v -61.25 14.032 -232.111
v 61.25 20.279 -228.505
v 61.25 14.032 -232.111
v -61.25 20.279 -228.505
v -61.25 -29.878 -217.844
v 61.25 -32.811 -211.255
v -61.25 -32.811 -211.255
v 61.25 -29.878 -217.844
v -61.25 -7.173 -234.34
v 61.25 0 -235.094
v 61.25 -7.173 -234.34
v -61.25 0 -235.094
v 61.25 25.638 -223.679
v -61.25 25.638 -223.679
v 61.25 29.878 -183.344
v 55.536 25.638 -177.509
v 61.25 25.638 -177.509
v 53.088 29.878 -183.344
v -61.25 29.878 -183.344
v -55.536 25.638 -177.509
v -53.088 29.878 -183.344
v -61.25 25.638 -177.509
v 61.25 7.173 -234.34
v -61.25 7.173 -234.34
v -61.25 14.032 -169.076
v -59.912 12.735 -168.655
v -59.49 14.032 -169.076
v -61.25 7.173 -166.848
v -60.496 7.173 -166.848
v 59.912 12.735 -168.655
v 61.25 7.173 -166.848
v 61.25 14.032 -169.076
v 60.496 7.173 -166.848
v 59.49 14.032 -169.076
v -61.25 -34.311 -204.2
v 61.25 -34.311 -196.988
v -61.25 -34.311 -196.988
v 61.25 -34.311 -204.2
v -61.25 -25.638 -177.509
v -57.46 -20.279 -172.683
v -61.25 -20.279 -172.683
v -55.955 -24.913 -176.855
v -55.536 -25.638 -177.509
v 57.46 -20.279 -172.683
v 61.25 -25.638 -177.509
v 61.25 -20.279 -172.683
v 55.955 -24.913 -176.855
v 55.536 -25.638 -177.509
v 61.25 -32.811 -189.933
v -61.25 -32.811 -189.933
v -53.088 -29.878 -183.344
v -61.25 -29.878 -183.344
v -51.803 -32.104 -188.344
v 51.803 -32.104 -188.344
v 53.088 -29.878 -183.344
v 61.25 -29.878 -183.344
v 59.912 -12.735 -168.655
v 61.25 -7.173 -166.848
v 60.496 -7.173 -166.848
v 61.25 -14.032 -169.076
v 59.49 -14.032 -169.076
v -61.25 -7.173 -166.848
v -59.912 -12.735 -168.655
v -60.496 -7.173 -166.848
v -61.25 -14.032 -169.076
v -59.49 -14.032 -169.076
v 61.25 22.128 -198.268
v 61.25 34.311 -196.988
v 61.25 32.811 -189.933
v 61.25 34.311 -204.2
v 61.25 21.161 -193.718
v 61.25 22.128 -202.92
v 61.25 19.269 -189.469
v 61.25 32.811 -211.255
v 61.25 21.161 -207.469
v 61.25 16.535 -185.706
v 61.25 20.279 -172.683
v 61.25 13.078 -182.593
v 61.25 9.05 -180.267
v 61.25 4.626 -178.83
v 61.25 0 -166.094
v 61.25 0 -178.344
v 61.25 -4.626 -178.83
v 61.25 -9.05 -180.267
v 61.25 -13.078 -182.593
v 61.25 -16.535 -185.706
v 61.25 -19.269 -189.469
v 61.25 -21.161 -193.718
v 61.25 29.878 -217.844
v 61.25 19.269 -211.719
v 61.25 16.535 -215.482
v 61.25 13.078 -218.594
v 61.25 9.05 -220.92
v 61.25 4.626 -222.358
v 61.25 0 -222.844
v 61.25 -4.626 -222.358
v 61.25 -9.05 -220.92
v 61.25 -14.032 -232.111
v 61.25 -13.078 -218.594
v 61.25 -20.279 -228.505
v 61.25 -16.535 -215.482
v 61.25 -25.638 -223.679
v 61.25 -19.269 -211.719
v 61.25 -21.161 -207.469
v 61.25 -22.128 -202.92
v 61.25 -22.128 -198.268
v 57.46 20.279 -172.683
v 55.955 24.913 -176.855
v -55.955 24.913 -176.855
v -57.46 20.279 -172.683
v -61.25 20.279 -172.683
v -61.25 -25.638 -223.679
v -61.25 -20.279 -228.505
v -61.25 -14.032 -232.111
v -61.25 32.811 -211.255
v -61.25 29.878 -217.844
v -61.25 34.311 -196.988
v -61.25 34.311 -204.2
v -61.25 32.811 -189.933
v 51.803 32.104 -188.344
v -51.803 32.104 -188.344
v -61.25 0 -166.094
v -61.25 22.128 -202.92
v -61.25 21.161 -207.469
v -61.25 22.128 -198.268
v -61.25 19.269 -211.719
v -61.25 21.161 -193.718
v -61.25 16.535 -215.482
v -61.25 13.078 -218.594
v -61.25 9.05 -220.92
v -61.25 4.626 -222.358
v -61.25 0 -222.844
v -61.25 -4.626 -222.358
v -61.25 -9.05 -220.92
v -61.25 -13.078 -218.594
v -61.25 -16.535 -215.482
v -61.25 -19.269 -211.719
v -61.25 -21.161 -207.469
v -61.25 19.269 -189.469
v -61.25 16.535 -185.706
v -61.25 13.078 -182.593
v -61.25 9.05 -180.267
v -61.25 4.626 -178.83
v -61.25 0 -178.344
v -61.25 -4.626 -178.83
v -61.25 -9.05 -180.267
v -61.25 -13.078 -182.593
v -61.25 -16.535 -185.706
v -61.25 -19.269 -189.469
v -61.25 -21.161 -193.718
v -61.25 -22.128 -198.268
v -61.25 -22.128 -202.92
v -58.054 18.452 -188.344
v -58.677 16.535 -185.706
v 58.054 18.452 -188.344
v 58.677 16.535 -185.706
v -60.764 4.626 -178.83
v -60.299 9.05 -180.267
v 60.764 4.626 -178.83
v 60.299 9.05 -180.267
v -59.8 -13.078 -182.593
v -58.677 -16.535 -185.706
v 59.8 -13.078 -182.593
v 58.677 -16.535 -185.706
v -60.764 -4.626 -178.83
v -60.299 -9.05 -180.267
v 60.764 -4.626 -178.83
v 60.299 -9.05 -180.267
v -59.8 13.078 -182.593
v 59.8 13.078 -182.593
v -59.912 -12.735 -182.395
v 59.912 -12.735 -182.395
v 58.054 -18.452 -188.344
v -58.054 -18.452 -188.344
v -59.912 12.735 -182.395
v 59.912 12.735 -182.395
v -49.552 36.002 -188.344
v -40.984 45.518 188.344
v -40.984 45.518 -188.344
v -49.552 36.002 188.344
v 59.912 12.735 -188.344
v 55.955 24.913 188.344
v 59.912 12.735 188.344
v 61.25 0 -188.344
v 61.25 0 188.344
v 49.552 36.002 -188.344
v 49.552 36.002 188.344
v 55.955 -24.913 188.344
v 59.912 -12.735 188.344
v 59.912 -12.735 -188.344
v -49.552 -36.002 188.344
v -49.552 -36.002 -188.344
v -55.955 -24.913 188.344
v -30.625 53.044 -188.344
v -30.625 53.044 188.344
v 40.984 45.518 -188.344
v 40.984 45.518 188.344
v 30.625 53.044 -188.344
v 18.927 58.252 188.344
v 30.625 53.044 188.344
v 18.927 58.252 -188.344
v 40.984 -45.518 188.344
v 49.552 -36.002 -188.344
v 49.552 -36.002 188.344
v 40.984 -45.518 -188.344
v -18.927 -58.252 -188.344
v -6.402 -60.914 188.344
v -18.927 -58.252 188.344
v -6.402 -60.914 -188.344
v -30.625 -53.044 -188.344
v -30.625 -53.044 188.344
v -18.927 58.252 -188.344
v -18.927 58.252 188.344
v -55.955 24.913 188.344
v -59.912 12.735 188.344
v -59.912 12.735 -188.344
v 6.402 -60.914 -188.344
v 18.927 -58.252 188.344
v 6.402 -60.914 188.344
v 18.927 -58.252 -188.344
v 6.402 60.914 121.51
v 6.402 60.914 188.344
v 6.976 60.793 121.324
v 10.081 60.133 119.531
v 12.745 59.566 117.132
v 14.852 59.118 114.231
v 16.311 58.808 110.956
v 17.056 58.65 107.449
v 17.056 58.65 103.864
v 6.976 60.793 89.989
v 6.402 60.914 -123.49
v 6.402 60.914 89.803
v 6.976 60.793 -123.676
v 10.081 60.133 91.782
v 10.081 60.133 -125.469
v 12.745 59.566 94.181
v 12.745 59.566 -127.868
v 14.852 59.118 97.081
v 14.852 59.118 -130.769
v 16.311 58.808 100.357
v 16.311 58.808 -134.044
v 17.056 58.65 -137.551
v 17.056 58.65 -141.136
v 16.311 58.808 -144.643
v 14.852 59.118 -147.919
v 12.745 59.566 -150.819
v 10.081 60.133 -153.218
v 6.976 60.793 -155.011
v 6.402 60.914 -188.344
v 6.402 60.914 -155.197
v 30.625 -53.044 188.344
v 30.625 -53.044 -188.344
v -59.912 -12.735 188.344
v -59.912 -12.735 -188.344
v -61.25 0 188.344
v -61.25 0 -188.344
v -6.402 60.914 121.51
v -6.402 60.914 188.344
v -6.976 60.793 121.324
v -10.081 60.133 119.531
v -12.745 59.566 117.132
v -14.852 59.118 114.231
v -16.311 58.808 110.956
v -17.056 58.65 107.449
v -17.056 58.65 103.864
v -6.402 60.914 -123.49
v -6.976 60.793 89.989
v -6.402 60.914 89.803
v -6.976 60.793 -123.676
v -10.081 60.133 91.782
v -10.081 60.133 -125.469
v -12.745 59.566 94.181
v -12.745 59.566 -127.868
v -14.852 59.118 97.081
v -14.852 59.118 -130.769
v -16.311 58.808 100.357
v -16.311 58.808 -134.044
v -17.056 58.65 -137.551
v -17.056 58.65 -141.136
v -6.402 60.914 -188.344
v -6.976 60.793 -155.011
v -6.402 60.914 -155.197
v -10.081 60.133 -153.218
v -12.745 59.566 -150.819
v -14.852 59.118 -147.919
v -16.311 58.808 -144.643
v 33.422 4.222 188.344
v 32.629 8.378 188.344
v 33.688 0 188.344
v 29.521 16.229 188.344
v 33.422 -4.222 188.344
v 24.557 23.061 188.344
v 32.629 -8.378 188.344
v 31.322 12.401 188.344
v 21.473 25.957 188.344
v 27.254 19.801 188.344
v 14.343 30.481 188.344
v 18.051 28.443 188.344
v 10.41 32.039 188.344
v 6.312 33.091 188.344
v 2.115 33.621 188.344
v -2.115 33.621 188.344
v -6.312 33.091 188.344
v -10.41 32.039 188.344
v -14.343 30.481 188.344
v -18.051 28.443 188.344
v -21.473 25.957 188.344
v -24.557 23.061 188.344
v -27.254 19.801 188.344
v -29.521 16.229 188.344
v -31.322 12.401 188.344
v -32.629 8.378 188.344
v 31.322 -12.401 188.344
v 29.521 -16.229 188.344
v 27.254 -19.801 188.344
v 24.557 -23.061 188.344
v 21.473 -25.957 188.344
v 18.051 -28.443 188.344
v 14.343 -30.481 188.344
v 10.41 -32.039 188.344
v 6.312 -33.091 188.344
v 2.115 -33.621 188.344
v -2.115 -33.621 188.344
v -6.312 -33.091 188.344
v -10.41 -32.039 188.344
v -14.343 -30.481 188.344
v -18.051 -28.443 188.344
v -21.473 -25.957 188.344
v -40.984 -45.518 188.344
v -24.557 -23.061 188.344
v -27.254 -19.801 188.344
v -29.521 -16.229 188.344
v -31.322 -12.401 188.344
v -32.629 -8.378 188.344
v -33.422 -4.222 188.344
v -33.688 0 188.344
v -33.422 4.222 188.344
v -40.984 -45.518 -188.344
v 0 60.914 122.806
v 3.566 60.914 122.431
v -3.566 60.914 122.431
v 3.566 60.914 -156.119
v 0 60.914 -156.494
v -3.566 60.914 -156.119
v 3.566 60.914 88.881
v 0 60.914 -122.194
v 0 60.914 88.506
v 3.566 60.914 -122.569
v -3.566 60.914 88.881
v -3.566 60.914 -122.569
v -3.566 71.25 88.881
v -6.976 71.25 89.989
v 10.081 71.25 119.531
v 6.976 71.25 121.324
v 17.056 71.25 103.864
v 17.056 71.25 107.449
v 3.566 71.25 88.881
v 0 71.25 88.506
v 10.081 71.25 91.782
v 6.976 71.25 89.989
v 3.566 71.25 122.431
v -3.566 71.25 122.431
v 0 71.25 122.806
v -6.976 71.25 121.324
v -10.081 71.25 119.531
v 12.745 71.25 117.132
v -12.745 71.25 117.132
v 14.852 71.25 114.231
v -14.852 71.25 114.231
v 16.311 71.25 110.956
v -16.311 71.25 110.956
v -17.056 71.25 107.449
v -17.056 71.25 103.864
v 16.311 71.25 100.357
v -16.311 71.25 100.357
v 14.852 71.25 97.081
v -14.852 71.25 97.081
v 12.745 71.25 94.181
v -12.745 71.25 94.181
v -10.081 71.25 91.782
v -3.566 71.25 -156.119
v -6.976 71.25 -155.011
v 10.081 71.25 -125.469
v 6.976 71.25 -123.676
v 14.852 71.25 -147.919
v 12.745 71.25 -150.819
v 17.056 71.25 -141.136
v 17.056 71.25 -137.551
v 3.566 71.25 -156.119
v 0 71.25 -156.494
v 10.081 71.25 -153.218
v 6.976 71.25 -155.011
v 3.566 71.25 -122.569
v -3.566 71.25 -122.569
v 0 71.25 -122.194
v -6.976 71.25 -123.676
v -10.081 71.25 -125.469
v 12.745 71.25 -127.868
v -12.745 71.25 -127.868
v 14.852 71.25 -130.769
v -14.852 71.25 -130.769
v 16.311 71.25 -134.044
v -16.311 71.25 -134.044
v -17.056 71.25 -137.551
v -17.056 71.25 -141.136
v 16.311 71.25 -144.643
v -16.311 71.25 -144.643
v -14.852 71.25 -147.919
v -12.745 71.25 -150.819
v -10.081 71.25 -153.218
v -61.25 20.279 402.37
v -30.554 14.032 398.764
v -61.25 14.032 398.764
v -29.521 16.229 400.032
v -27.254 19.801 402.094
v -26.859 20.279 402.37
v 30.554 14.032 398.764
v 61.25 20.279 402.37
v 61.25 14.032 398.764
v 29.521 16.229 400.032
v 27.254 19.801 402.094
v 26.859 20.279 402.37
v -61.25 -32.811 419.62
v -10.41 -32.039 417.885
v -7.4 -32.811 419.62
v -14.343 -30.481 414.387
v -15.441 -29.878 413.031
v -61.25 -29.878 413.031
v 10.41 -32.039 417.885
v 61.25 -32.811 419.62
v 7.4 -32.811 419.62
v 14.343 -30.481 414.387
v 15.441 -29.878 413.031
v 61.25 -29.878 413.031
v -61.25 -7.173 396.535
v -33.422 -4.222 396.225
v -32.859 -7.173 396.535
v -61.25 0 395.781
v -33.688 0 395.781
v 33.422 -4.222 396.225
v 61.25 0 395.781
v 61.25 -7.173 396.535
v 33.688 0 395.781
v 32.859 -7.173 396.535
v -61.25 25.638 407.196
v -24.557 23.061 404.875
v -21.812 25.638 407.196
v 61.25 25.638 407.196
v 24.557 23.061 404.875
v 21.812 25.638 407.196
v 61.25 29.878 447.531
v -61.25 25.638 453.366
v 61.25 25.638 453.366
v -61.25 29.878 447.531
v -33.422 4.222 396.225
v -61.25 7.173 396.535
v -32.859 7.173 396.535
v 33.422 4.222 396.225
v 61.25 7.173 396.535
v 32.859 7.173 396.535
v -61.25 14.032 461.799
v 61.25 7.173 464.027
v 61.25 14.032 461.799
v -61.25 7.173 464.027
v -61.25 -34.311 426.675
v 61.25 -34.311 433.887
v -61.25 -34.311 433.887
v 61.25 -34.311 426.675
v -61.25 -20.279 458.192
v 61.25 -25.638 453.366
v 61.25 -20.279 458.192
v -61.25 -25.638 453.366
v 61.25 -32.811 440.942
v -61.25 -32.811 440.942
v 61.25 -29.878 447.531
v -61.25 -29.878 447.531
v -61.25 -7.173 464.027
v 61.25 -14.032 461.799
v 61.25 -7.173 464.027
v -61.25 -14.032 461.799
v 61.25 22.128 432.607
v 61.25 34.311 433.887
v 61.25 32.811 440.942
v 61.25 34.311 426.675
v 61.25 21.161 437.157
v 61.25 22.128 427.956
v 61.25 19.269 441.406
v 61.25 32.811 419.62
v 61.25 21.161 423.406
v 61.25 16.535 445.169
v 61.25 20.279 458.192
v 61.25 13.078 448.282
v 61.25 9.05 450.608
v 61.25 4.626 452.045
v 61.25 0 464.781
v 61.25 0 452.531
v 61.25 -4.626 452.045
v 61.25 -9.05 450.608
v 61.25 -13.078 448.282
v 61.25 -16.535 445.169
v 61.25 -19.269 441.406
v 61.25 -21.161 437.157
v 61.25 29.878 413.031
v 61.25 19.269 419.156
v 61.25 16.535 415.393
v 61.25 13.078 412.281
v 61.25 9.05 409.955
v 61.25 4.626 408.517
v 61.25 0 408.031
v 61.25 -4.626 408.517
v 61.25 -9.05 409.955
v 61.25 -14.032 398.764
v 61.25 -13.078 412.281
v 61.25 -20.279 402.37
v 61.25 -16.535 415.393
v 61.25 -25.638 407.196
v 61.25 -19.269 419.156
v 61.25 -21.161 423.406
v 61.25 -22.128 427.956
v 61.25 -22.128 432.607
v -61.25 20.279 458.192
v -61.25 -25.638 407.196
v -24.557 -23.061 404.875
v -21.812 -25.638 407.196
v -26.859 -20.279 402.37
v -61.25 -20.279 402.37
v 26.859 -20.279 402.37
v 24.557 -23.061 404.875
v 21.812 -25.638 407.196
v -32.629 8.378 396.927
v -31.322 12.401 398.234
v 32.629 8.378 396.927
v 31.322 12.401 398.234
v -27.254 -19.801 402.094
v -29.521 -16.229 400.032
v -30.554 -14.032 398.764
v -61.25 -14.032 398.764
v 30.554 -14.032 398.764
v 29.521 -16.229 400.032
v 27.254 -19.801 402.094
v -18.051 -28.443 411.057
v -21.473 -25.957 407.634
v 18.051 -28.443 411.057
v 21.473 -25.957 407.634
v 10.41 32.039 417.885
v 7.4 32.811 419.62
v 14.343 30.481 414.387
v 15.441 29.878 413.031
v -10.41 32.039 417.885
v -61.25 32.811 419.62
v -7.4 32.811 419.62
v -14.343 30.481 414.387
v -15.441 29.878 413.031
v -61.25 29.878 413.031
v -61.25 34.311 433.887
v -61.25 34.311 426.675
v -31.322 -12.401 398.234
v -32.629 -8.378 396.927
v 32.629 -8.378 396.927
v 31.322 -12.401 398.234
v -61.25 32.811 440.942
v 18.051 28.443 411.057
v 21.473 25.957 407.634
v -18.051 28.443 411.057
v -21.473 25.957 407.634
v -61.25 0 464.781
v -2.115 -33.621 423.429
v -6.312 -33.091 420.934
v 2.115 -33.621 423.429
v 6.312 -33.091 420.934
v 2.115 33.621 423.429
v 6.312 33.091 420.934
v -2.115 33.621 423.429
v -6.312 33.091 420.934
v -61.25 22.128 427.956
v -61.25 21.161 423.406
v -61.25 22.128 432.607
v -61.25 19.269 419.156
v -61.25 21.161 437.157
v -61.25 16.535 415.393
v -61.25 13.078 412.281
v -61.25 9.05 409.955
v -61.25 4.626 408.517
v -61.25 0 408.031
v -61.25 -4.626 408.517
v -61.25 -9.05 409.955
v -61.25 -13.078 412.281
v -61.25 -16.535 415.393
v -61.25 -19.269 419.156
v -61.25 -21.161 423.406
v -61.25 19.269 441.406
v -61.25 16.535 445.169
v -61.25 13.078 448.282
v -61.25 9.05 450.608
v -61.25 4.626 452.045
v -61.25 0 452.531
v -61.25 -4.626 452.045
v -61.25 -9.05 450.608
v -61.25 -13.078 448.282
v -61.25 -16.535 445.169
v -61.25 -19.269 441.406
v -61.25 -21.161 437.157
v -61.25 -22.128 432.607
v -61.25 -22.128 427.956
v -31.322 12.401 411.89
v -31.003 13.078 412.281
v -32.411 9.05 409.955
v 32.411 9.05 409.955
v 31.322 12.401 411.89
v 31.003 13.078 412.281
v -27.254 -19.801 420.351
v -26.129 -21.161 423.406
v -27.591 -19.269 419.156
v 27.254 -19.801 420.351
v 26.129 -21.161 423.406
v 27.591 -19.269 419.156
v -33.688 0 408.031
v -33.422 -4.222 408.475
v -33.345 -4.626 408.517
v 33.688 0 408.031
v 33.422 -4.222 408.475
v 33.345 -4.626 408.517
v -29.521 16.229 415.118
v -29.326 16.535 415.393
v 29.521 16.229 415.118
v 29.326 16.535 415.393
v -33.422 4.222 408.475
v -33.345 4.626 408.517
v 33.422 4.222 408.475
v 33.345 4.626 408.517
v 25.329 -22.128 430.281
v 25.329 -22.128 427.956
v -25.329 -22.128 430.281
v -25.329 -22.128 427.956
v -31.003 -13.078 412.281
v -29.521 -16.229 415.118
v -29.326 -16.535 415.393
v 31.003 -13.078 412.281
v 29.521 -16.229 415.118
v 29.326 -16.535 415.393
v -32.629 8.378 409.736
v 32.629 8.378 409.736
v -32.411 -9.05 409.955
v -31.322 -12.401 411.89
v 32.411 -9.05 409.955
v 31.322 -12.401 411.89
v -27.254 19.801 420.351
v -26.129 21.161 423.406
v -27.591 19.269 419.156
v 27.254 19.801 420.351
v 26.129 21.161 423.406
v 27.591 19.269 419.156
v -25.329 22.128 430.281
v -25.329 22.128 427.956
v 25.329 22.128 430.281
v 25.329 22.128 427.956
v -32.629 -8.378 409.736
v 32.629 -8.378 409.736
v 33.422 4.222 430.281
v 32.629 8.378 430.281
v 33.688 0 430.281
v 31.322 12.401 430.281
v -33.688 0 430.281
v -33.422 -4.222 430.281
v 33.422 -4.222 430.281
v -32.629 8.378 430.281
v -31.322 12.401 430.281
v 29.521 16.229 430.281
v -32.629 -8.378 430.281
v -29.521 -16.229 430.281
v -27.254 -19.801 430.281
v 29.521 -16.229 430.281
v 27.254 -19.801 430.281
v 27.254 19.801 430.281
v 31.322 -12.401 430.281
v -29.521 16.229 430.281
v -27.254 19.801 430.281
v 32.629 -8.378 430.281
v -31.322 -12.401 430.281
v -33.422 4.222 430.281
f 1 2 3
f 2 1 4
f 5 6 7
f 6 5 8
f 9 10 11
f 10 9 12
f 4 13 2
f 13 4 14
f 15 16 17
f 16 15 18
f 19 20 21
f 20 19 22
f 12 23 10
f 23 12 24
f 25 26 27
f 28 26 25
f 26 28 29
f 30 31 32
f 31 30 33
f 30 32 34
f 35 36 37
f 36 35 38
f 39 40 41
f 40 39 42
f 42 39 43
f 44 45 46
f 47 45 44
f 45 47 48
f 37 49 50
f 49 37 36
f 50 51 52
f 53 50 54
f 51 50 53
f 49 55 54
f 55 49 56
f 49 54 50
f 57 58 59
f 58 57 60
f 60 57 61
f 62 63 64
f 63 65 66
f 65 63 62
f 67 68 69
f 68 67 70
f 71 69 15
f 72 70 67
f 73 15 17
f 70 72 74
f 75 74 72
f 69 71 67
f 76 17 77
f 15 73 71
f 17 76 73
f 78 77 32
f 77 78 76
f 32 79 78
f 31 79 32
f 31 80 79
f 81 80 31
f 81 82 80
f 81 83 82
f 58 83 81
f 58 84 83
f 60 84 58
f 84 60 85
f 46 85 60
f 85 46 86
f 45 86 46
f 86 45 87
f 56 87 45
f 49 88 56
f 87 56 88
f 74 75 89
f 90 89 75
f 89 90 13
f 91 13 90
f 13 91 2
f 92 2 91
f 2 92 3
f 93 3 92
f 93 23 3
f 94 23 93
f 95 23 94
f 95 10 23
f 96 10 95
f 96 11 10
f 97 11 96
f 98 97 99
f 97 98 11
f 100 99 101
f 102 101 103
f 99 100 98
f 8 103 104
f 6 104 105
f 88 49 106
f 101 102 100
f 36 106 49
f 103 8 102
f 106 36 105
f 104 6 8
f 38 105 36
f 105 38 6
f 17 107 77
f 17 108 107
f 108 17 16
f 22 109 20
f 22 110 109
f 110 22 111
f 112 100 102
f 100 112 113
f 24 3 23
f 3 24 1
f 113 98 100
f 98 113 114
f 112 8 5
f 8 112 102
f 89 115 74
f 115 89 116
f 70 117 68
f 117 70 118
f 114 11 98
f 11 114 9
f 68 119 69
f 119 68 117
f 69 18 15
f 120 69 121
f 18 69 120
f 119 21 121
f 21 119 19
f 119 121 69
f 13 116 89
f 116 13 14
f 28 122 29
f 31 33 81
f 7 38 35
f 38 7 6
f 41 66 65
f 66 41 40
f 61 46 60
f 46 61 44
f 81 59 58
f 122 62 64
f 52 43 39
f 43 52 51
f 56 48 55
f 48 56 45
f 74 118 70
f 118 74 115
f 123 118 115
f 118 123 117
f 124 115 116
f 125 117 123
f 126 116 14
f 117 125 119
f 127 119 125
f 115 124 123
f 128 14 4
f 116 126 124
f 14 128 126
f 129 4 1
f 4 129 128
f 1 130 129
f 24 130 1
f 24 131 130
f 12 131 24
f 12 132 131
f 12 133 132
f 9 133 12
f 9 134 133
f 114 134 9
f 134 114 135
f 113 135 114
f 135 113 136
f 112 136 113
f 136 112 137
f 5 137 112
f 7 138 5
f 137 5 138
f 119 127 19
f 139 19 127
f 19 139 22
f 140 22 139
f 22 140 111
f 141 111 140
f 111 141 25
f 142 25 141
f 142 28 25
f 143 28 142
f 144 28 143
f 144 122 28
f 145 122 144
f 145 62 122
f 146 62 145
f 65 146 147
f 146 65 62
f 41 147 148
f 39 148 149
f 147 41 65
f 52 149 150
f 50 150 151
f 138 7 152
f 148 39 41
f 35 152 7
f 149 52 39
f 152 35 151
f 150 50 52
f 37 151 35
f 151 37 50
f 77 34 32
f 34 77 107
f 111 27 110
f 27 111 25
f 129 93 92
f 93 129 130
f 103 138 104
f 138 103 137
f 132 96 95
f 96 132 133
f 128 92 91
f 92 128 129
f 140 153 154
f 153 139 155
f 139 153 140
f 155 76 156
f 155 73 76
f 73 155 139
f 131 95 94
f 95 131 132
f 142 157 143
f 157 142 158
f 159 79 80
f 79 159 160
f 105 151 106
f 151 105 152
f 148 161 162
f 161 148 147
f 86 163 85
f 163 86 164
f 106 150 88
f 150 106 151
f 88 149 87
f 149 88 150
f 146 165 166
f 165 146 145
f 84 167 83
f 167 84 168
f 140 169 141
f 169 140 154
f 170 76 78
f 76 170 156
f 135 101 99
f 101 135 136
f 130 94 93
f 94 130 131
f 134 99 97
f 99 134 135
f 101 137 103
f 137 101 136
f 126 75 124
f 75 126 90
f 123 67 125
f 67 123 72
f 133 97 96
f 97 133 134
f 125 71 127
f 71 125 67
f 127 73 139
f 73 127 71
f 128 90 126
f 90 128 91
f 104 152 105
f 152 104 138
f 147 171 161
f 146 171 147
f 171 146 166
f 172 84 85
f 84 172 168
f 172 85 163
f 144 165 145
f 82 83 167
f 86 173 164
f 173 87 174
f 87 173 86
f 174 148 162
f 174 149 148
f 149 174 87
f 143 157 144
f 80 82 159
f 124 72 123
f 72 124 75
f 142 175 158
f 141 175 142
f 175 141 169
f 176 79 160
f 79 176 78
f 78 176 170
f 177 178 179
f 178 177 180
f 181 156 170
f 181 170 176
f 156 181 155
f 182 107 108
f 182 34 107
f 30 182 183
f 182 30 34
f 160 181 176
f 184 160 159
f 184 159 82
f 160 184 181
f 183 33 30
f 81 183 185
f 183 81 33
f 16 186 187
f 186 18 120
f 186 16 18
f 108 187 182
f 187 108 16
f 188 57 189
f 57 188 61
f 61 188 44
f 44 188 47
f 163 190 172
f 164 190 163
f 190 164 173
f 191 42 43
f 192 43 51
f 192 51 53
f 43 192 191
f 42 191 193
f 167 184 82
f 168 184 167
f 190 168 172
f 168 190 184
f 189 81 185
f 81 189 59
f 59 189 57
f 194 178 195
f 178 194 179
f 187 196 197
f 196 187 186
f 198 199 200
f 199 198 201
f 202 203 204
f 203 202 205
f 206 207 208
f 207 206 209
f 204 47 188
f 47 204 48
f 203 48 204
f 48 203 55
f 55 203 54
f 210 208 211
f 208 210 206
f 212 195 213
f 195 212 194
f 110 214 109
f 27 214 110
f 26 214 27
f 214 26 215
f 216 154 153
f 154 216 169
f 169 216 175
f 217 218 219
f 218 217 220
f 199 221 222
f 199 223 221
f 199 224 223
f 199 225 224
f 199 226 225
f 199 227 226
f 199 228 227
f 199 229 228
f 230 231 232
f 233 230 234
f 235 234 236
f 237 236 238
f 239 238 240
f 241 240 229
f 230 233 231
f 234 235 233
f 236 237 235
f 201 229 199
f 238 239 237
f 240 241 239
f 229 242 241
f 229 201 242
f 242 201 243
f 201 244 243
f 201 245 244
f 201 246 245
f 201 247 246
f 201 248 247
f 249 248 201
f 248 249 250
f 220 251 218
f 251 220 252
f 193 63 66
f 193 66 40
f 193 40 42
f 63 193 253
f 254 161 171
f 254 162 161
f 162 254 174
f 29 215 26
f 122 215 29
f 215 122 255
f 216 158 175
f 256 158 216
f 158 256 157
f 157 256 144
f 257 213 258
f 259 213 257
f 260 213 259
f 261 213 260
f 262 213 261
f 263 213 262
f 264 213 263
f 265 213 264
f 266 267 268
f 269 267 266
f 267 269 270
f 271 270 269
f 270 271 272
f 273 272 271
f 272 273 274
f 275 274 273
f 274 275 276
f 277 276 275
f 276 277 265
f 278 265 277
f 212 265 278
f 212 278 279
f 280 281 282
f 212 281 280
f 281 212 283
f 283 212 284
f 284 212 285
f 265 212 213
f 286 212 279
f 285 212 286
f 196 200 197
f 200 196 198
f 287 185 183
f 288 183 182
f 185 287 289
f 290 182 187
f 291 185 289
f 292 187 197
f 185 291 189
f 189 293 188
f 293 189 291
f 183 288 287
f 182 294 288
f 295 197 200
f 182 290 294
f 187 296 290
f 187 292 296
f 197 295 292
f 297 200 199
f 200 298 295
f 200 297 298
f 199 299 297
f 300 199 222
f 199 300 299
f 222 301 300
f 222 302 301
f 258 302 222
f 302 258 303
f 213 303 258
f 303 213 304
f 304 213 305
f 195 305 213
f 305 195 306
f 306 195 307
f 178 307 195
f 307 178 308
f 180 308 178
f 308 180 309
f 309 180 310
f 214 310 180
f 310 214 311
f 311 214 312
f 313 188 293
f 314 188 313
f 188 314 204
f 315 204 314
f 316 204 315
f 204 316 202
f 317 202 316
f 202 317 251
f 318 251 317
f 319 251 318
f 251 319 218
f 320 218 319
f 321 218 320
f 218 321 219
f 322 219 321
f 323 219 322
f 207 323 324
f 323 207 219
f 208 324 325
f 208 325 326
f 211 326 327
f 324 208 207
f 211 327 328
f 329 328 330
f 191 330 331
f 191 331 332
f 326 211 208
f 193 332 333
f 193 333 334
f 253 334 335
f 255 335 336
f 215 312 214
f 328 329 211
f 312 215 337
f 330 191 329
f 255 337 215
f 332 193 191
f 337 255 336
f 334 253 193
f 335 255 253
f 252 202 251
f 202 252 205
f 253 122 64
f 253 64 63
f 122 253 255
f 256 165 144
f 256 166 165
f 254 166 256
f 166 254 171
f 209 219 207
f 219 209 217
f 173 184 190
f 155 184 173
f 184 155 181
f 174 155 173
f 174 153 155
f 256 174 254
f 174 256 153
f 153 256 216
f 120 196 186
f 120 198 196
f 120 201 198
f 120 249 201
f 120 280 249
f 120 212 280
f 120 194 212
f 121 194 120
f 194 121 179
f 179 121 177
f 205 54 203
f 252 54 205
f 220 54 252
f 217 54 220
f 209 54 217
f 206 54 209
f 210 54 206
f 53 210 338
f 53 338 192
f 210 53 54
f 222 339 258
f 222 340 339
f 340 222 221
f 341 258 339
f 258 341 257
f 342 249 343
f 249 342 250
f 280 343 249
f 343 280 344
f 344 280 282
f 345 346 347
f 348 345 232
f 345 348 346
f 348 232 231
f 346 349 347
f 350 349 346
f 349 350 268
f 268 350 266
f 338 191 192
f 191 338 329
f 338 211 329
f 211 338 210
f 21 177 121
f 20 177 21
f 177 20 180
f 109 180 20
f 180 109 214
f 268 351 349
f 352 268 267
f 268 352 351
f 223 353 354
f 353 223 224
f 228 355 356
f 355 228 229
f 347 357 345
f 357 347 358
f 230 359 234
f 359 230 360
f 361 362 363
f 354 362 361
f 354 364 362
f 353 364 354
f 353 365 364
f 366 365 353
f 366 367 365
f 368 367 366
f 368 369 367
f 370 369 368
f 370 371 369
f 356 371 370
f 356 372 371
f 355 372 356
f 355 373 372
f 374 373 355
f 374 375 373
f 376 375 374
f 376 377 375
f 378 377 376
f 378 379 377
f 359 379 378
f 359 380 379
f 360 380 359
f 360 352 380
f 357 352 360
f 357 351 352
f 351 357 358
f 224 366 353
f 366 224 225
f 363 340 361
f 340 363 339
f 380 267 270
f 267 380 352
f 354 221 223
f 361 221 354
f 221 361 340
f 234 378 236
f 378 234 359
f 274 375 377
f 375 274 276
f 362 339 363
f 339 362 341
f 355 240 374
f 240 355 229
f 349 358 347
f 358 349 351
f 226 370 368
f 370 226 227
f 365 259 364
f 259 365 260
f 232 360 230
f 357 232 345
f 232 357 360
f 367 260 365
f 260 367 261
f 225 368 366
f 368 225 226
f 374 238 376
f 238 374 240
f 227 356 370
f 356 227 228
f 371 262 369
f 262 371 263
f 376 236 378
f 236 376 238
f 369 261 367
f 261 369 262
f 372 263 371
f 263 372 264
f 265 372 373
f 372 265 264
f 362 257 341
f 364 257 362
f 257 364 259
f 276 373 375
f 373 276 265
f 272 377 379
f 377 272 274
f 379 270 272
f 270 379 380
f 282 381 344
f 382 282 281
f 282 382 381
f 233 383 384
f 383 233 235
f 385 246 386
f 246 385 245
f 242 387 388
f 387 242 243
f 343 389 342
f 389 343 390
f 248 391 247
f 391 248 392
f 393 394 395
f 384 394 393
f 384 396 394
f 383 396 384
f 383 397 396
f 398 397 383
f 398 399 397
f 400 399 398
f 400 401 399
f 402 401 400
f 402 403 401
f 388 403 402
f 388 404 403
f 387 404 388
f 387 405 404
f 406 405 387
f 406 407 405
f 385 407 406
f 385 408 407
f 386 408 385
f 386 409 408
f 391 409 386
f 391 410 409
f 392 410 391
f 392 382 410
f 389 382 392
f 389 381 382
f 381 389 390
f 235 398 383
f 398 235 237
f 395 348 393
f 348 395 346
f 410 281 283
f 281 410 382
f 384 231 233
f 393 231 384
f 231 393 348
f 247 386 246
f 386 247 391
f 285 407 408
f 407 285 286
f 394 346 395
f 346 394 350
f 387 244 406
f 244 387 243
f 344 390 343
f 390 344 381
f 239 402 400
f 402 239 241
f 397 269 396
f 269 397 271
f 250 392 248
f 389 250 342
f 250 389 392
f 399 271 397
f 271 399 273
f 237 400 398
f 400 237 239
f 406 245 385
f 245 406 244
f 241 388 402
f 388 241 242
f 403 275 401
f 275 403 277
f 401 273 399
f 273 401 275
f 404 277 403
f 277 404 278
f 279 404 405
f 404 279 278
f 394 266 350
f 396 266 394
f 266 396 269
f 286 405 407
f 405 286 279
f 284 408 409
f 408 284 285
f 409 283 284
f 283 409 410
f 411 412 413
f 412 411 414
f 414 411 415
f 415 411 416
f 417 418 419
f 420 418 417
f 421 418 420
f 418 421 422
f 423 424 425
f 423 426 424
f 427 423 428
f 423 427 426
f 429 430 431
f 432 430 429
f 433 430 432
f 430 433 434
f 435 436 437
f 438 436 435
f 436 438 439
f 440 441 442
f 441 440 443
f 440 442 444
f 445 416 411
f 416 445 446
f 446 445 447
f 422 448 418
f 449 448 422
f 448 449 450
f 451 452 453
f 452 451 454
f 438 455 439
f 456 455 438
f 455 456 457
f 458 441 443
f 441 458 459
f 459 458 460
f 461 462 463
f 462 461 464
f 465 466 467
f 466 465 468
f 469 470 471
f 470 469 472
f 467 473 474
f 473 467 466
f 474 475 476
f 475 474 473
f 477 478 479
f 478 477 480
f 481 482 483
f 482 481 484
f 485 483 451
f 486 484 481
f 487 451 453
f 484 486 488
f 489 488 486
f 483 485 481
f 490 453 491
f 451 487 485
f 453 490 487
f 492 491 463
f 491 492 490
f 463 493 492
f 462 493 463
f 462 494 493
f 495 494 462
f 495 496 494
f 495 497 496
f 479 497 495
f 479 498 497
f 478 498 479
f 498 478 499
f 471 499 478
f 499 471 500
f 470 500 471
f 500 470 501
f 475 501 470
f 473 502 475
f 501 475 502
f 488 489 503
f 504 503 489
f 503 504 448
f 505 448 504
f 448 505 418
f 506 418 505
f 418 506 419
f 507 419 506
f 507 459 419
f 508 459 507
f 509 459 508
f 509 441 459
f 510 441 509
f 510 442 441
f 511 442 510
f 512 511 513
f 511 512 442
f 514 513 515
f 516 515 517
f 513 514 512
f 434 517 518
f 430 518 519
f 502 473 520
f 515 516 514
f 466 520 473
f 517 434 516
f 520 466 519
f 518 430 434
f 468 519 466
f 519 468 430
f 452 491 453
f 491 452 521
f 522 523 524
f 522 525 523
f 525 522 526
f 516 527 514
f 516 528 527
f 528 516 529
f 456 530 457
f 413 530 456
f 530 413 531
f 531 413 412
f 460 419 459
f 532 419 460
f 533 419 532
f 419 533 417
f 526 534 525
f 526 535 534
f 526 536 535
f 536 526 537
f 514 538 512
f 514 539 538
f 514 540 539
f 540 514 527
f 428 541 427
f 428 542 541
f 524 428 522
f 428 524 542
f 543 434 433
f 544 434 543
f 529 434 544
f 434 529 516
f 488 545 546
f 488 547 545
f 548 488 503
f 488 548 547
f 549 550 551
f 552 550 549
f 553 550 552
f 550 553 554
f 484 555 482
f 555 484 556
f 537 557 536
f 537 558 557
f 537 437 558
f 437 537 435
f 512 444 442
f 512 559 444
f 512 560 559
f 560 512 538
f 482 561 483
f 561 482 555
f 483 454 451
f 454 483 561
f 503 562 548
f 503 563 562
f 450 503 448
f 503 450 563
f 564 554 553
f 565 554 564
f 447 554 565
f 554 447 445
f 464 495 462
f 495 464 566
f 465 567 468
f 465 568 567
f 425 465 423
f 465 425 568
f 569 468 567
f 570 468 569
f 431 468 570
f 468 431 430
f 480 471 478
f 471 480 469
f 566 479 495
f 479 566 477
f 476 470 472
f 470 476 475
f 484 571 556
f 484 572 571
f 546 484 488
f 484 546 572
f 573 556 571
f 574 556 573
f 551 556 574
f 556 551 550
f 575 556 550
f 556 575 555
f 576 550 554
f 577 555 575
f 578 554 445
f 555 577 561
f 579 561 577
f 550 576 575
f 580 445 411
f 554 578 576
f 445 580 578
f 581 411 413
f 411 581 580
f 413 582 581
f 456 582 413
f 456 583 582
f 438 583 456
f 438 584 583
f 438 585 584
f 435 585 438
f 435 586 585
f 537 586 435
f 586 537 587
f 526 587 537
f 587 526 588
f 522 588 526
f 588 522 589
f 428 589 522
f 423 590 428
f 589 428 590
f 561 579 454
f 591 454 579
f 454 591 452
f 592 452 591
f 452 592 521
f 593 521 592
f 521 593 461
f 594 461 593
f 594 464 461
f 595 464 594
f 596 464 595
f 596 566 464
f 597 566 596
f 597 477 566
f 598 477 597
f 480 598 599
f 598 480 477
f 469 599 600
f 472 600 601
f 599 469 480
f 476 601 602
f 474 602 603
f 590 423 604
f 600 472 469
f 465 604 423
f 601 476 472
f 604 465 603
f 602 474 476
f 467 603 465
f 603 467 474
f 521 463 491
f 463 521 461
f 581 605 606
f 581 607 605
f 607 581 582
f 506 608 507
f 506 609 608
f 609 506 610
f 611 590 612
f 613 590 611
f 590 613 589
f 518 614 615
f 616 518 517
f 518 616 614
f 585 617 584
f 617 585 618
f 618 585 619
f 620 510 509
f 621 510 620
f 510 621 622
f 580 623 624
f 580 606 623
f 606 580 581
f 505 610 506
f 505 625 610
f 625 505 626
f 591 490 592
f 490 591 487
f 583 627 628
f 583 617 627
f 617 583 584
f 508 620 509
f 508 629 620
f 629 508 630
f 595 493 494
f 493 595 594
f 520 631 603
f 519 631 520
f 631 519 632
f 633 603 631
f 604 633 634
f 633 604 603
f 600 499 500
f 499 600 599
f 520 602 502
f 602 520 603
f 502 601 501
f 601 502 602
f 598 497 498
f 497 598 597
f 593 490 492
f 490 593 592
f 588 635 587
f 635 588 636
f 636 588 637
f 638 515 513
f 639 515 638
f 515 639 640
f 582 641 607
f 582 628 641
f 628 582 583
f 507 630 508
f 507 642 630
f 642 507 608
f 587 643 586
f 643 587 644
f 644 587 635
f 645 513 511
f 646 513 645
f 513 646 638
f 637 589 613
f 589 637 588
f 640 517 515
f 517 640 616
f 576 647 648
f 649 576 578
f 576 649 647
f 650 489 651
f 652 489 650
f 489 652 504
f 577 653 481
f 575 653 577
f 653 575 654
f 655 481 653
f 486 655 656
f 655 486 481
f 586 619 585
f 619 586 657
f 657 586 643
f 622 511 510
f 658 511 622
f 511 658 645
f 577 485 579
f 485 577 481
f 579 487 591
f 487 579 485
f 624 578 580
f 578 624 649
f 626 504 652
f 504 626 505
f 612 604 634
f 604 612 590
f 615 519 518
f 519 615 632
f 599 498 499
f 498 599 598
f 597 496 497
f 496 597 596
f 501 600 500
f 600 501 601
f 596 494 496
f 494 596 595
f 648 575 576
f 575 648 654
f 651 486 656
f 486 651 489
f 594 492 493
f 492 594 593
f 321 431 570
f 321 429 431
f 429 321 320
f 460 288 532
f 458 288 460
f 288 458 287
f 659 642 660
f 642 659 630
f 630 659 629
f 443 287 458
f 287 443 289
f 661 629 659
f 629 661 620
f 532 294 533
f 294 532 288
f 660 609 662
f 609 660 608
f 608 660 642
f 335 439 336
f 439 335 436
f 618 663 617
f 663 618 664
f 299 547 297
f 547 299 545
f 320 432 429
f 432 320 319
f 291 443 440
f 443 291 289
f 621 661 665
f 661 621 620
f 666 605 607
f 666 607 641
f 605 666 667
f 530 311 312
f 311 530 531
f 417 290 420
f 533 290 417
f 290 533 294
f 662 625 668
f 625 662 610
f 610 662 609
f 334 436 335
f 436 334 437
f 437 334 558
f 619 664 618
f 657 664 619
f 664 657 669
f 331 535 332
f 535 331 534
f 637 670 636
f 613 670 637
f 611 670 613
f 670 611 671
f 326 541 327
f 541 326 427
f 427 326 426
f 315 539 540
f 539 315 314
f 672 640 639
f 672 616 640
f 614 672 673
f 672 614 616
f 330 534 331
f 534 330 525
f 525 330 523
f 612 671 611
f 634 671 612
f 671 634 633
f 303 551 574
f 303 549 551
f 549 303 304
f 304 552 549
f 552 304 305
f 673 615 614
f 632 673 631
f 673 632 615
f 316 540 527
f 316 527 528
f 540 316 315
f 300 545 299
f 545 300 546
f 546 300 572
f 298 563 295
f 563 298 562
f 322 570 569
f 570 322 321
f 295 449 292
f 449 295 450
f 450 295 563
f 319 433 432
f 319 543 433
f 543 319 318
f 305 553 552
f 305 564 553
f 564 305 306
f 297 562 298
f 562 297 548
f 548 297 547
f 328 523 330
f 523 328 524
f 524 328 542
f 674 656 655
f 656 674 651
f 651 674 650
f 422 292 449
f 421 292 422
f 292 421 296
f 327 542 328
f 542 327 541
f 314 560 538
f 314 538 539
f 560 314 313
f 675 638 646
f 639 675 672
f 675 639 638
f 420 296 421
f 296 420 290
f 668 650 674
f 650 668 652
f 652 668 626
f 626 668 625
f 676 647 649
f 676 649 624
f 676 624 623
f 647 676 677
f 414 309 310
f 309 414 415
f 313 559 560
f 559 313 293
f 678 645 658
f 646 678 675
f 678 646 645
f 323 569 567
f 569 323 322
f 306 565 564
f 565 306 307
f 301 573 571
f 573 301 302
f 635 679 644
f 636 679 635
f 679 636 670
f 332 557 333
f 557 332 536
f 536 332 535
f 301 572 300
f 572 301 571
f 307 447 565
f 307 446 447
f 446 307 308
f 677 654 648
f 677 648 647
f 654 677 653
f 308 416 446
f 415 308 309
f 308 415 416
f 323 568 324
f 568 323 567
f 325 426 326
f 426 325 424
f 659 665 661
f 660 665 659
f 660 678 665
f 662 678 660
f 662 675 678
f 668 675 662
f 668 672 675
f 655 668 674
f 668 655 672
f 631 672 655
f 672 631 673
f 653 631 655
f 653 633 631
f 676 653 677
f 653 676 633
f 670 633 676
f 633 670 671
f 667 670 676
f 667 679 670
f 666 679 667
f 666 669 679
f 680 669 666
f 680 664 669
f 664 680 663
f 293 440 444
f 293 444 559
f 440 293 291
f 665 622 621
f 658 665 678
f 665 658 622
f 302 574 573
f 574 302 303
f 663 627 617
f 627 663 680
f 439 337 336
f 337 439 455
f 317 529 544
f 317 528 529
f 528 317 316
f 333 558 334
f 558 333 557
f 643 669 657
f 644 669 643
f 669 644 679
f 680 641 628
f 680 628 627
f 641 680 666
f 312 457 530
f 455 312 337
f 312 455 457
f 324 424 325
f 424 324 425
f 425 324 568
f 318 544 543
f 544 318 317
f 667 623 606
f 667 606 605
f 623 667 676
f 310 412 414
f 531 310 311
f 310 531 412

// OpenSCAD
// file: parametric_cylinder_modules.scad
a= 90;// a = connector widthness
b= 10;// b = connector thickness
c=50;// c = height of the cube *[]this needs to be improved
d=50;// d = hole
e=100;// e = depth 
    
module connector_01(a,b,c,d,e){
    module bb_02(){
        module bb_01(){
        color("lime")translate([0,0,-c/2])cube ([a,b,c], center=    true);
        rotate([90,0,0])cylinder(d=a,h=b, center=true);
        }
    
    difference(){
        bb_01();
        rotate([90,0,0])cylinder(d=d,h=b+b, center=true);
        }
    }
    
    cube ([a,e,b], center=true);
    translate([0,-e/2+b/2,c]) bb_02();
    translate([0,e/2-b/2,c]) bb_02();
}

//translate([0,0,210])
/*color("red")connector_01(
90,// a = connector widthness
10,// b = connector thickness
50,// c = height of the cube *[]this needs to be improved
50,// d = hole
100// e = depth
);*/ 


connector_01(a,b,c,d,e);
// main file
/* README
Intro:
This is a parametric model of simple hydraulic cylinder, based on the catalog of Chief cylinders[1]. Additionally we have added two modifications to this standard model.

1) a hole on the rod
2) a connection at the bottom in blue

How to use it:
- Change the parameters in the module call below
- For standard- off the shelve cylinders look for the
- The variables from a to e, are taken from a specific catalog provided in the references. Be aware that these might change from catalog to catalog.
- You can generate an extended or non extended version of the model by changing the turning this parameter to true or false.

References:
[1]

*/

//-[]* under certain conditions load certain modules

/*
Solution to the problem: have different files with same name variables


*/
use <parametric_cylinder_modules.scad>

//mm is the standard unit

/*[Tab Name]*/
units="inch";//["in","mm"]
unit=24.5;// hidden *[] fix the problem of inch and milimiters
/*[Drop Down box:]*/
// cylinder model
model="002";//["001","002","003"]

/*[Other Parameters]*/
//Stroke
stroke=8;//[20]
bore=5;//[20]
extended=true;// for extended set true, for not extended false
//size of the full cylinder
a= 9.25;//[40]
//offset of the cylinder rod with respect to the tube
b= 1.875;//[10]
//upper port location place
c= 3.375;//[10]
//lower port location
d= 2;//[10]
e= 0.375;//tubing wall
//select type of port
sae= 0.7;//sae *[] select put a string stating select type of port as a place holder
// rod size
rod=2.75;//[10.00]




module hydraulic_cylinder(){

// the current model is:216-380
    bore=bore*unit;
    a=a*unit;
    b=b*unit;
    c=c*unit;
    d=d*unit;
    e=e*unit;
    bore=bore*unit;
    stroke=stroke*unit;
    sae=sae*unit;
    tube_l=a+stroke-b;
    rod=rod*unit;
    rod_l=a+stroke-b;
    
    // optional model
    module connection(){
        difference(){
        rotate([0,90,0])
        cylinder(r=unit+10, h=bore, center=true);
        rotate([0,90,0])
        cylinder(r=unit/2+10, h=bore*2, center=true);
        }
    }
    
    // construct Hydraulic ports
    module h_connection(){
        translate([0,bore/2,0])
        rotate([90,90,0])
        cylinder(r=sae,h=20,center=true);
        }
    // construct body of cylinder (aggregate modules)
    module cylinder_body(model){
    translate([0,0,-(tube_l/2+unit/2)])

        if (model=="002"){
            connection();
         }

    cylinder(r=bore/2,h=tube_l,center=true);
    // These are the positions of hydraulic connectors
    translate([0,0,tube_l/2-c])h_connection();
    translate([0,0,-(tube_l/2-d)])h_connection();
    }

    // Parameters for hydraulic connections
    //SEA connection port dimension
    //Construct rod
    module rod(){
        translate([0,0,b])
    //different connectors
        if (model=="001") {//*[] set proper parameters
        //custom made hole
        difference(){
        cylinder(h=rod_l,r=rod/2,$fn=50, center=true);
        color("lime")
        rotate([90,0,0])
        translate([0,rod_l/2-(rod_l*1/10),0])
        cylinder(r=10,h=bore*3,center=true);
        }
    }

        else if (model=="002"){
            // lower cylinder connection
            translate([0,0,rod_l/2])
            connection();
            cylinder(h=rod_l,r=rod/2,$fn=50, center=true);


        }

    }
    
    // cylinder body call
    color("red")
    cylinder_body(model);
    // Call rod extended or retracted
    if (extended == true){
            translate([0,0,stroke])rod();
    }
    //unextend
    else{
        translate([0,0,])
        rod(); // *[ ] independizar modulo
        }

  }

if (units=="inch"){
    unit=24.5;
    }
//*[] Not working properly change to milimiters    
else{
    unit=1;
    }

// Call hydraulic cylinder
hydraulic_cylinder();
